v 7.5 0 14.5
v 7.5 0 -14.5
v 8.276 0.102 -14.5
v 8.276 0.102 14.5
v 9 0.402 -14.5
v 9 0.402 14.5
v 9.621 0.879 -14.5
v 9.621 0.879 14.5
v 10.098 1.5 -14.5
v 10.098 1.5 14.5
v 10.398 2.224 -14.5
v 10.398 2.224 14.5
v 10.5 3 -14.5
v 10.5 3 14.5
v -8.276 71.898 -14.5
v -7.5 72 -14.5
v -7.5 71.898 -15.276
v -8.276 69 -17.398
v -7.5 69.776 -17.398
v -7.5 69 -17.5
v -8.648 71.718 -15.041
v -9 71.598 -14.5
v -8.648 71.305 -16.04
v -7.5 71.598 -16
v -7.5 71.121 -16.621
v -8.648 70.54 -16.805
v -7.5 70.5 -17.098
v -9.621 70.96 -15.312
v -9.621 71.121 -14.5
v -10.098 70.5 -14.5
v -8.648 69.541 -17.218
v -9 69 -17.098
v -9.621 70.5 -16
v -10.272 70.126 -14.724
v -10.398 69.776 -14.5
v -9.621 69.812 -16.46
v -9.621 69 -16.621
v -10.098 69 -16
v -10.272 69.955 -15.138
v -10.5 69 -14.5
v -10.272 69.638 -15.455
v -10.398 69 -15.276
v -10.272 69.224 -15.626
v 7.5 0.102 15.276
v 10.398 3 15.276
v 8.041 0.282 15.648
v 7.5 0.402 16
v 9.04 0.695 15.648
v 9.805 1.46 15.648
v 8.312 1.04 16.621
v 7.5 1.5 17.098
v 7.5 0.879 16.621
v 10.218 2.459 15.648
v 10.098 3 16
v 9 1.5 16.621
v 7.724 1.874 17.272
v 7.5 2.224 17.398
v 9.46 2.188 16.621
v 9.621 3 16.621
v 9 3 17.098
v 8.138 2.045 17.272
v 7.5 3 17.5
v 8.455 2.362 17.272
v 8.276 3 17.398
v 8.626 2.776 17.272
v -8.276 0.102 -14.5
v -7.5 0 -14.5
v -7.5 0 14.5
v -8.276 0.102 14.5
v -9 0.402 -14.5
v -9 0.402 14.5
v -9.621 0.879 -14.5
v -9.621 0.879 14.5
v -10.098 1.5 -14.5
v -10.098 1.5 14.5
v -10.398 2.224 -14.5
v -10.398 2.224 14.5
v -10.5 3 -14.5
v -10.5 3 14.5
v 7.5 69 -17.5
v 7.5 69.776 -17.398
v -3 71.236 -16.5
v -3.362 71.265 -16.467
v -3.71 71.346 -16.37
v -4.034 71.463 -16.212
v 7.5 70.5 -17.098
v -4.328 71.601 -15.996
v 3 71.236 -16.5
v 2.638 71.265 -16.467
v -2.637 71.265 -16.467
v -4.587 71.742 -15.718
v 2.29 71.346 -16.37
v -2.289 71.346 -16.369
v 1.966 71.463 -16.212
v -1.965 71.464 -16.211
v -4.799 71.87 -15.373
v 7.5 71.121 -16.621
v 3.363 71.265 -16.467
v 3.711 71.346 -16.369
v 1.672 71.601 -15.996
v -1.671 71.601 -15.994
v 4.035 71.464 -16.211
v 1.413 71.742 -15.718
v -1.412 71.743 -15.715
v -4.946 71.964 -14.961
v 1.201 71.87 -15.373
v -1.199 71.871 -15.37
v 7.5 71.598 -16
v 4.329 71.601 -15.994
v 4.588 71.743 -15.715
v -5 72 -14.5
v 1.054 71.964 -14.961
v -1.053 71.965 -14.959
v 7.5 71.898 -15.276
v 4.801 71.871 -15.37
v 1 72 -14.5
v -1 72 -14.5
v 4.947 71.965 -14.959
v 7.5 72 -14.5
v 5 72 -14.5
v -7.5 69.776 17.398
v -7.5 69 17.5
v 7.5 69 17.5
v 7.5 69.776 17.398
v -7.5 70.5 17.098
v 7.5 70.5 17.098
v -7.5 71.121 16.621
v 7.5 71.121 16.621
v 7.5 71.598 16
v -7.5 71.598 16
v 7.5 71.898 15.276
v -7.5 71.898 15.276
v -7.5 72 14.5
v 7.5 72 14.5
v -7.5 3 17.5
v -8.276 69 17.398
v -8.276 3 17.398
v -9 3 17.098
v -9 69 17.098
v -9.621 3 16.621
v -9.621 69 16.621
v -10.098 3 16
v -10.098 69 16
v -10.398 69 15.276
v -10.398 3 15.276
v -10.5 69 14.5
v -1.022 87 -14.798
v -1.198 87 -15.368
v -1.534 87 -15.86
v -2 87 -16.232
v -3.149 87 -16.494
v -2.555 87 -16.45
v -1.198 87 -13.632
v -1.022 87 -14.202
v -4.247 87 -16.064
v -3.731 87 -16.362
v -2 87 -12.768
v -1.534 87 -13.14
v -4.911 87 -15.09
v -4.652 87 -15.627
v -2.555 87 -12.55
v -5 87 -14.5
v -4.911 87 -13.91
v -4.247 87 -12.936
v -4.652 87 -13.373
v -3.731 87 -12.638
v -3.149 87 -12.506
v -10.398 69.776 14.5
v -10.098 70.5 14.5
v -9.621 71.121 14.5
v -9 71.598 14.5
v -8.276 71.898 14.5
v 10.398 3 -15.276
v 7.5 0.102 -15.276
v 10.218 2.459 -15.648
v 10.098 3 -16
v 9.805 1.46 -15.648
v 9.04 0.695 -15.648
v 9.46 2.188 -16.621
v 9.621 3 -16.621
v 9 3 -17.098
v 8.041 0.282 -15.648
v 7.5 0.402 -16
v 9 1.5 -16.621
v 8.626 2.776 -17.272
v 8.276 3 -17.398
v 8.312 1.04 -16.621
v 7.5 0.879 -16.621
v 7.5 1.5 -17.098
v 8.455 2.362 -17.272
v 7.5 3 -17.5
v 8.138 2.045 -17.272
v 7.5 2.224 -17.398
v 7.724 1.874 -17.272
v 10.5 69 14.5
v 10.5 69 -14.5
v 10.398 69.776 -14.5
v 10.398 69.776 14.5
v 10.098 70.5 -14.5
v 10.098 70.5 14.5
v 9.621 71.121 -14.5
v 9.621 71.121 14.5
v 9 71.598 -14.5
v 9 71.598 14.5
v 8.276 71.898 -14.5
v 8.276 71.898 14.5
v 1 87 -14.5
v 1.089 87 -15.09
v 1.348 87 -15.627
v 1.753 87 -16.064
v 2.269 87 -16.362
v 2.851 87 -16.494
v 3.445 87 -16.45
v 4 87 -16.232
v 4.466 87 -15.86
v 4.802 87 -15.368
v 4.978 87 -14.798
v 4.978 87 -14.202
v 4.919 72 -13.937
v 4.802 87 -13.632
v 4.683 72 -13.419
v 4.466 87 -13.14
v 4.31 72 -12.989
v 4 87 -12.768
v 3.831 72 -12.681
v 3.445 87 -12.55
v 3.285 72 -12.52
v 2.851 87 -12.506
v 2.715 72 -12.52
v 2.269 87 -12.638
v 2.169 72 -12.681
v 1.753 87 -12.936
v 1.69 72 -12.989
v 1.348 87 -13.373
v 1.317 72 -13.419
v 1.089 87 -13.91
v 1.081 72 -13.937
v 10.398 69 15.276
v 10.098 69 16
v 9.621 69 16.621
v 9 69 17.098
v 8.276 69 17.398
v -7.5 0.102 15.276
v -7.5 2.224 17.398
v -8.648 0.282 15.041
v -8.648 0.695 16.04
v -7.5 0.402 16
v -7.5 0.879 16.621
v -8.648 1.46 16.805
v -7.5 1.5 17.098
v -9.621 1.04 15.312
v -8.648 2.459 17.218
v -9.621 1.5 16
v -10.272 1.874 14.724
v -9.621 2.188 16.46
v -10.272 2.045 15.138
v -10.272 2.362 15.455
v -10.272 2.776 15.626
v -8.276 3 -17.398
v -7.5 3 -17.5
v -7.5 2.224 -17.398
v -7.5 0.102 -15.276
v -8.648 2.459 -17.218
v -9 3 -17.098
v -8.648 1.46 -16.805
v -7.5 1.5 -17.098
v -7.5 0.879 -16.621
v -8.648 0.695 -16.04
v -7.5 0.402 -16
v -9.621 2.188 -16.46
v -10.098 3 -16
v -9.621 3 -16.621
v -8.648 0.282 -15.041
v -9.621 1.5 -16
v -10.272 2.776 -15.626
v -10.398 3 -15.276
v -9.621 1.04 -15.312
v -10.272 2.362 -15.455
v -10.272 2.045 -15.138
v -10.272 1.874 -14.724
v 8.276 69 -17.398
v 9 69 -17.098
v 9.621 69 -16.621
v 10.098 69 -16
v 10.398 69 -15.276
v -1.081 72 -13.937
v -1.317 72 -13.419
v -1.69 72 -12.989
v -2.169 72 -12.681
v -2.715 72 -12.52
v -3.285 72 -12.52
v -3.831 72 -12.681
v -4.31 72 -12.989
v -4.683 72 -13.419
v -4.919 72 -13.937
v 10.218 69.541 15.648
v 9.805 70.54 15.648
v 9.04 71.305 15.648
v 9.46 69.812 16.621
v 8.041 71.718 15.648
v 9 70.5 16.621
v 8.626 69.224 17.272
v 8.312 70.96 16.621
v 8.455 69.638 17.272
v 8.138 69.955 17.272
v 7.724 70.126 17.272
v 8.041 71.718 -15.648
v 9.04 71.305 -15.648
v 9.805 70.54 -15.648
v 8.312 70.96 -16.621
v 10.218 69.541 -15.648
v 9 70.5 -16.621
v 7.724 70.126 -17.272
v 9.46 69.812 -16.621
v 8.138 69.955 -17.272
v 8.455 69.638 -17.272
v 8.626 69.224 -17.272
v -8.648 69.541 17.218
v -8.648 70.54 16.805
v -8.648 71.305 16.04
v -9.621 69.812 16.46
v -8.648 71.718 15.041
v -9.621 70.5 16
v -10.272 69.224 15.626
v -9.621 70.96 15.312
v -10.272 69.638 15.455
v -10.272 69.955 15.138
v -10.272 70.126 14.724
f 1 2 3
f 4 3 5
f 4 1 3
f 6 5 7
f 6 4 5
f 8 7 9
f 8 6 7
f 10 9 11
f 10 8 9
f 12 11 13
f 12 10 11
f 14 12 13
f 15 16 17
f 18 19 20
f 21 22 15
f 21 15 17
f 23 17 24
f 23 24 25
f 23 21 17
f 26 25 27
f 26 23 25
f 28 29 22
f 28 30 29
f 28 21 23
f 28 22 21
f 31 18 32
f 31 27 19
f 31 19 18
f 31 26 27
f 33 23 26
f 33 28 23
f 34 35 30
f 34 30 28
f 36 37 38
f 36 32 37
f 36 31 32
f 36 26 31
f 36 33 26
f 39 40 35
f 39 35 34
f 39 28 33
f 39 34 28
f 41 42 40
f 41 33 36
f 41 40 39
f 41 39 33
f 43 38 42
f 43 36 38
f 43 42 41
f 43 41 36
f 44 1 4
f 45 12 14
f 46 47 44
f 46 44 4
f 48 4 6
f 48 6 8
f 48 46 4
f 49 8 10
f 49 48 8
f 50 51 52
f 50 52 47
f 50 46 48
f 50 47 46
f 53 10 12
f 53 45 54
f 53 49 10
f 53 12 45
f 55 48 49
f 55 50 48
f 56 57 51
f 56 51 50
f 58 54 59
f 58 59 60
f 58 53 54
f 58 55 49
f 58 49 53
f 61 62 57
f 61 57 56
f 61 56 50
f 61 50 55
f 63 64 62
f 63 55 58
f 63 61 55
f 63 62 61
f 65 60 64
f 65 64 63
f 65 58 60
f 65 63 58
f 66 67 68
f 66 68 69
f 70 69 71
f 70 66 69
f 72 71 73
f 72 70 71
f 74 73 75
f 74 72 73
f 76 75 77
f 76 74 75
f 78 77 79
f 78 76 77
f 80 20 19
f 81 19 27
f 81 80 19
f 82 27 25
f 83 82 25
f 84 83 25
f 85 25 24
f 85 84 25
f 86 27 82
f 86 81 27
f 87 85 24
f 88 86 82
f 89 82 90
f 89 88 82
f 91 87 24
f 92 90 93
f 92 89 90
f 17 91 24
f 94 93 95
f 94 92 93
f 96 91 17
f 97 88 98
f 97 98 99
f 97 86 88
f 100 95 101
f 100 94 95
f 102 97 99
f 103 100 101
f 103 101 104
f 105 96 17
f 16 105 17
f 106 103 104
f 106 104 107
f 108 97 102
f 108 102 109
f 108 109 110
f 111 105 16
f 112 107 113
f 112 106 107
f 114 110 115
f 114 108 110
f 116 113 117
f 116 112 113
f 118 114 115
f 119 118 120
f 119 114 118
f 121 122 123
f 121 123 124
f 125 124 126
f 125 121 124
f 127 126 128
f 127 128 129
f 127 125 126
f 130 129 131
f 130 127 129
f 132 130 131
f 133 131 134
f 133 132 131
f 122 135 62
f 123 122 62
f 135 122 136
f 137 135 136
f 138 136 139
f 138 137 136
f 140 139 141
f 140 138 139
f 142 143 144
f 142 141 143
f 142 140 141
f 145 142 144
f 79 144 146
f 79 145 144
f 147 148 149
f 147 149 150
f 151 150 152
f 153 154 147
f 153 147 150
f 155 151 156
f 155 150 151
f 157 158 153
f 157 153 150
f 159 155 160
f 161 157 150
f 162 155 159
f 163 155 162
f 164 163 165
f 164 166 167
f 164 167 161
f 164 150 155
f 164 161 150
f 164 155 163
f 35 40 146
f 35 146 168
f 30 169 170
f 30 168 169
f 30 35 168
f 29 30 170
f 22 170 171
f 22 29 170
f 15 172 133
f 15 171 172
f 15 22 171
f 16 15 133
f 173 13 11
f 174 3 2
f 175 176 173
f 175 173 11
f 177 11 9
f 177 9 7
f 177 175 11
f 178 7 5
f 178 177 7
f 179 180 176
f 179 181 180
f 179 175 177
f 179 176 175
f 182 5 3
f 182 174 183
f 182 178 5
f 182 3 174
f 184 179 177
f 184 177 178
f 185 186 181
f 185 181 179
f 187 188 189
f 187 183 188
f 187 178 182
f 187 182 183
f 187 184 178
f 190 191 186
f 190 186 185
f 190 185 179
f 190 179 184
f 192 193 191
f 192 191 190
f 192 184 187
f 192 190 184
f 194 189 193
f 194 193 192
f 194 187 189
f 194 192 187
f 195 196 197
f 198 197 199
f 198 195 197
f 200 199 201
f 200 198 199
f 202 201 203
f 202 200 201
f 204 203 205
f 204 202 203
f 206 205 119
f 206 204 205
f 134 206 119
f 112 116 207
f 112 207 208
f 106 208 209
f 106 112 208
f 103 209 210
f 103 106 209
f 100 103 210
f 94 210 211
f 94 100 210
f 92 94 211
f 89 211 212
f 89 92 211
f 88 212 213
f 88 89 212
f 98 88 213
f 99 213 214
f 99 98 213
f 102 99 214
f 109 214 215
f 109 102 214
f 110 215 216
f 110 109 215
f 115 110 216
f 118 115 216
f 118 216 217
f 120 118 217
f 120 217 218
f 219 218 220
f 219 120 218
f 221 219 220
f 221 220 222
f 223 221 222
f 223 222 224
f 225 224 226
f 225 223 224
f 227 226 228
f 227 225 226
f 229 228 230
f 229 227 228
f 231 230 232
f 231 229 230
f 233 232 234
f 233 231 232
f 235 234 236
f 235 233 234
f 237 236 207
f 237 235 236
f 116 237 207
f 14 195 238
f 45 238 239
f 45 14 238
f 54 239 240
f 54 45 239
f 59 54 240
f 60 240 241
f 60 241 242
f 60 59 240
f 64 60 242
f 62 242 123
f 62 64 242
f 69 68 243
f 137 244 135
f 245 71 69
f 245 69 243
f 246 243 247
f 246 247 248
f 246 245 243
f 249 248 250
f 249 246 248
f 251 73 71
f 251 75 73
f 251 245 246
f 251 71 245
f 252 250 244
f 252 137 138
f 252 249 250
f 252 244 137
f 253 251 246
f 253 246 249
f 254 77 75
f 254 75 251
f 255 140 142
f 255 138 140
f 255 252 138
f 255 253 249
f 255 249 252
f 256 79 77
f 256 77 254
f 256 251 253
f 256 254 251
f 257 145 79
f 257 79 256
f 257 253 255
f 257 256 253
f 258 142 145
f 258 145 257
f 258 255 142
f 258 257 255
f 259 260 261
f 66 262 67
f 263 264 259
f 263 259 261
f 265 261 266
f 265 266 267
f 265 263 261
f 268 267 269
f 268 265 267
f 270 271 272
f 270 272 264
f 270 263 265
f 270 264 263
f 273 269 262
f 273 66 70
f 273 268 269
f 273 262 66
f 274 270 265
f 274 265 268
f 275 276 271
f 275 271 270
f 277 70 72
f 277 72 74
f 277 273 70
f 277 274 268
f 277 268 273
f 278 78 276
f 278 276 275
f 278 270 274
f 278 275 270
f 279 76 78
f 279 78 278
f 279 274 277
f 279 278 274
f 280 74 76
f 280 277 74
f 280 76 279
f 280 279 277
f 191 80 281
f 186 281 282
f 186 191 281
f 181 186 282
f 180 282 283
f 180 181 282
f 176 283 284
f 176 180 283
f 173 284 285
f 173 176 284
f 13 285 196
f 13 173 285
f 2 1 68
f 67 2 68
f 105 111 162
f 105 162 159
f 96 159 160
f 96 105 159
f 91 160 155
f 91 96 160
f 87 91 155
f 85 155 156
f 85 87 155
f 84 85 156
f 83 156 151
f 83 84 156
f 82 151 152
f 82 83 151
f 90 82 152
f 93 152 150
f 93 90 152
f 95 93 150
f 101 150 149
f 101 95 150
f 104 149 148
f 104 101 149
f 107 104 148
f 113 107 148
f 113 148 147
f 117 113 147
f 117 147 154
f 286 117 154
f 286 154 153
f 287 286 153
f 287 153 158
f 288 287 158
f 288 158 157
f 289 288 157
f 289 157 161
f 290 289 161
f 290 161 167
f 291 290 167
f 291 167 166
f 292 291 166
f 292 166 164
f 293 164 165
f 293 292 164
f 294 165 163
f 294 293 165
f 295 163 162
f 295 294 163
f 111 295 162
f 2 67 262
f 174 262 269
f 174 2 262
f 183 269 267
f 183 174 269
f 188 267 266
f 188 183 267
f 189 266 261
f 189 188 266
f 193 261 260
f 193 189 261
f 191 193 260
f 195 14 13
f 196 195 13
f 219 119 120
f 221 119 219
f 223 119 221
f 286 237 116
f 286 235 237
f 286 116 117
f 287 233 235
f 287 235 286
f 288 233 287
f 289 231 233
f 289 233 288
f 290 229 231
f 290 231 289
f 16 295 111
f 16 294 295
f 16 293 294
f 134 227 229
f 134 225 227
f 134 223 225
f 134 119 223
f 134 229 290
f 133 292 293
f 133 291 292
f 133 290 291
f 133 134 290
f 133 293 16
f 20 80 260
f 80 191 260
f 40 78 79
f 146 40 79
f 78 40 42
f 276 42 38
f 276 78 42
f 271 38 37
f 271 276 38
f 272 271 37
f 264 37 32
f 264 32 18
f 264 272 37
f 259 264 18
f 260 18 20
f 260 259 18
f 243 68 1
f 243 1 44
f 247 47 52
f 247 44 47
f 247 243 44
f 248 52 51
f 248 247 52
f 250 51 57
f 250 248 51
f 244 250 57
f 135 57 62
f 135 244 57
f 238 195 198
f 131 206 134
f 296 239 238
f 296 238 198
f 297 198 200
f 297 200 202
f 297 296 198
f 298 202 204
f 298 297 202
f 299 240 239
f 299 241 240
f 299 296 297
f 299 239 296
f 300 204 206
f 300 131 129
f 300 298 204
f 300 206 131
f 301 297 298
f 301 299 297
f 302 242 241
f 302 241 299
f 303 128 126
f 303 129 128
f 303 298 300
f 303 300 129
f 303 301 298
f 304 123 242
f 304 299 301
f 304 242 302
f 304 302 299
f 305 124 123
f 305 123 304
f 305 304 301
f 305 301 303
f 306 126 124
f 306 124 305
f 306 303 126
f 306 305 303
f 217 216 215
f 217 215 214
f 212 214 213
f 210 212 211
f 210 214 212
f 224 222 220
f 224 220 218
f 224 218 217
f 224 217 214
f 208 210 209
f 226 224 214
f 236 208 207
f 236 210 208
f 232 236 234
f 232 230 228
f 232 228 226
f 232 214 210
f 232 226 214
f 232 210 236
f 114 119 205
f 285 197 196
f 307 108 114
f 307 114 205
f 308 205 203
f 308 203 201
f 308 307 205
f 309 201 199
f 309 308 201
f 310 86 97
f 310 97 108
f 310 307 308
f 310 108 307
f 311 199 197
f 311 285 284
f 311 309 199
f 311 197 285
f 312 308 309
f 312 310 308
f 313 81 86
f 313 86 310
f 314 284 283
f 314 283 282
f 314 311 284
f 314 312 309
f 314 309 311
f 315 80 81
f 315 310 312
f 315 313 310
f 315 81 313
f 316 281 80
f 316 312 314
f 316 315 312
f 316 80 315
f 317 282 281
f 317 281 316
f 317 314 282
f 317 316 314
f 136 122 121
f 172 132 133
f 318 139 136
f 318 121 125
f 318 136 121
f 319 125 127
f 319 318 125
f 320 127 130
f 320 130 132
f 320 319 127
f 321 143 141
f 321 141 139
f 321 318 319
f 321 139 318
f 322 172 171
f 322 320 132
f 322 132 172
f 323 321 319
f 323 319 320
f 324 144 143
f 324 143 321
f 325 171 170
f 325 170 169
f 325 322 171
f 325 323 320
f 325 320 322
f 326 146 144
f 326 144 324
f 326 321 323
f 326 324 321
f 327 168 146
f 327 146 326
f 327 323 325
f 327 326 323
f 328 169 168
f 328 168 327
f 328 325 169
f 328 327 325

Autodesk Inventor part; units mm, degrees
ref_plane "YZ Plane" through (0, 0, 0) normal (1, 0, 0) x (0, 1, 0)
ref_plane "XZ Plane" through (0, 0, 0) normal (0, 1, 0) x (-1, 0, 0)
ref_plane "XY Plane" through (0, 0, 0) normal (0, 0, 1) x (1, 0, 0)
sketch "Sketch1" plane through (0, 0, 0) normal (0, 1, 0) x (-1, 0, 0)
  line L0 (10.5, 17.5) -> (-10.5, 17.5)
  line L1 (-10.5, 17.5) -> (-10.5, -17.5)
  line L2 (-10.5, -17.5) -> (10.5, -17.5)
  line L3 (10.5, -17.5) -> (10.5, 17.5)
  line L4 (10.5, 17.5) -> (-10.5, -17.5) construction
  line L5 (-10.5, 17.5) -> (10.5, -17.5) construction
  line L6 (0, -17.5) -> (0, -14.5) construction
  line L7 (0, -14.5) -> (3, -14.5) construction
  circle A0 centre (3, -14.5) radius 2
  circle A1 centre (-3, -14.5) radius 2
  point P0 (0, 0)
  dimension "d0" = 21
  dimension "d1" = 35
  dimension "d5" = 3
  dimension "d6" = 3
  dimension "d7" = 4
extrude "Extrusion1" add sketch "Sketch1" along normal blind 72 contours L3 L2 L1 L0 | A0 | A1
extrude "Extrusion2" add sketch "Sketch1" along normal blind 15 from surface at 72 contours A0 | A1
fillet "Fillet1" radius 3 12 edges at (10.5, 36, 17.5) (10.5, 36, -17.5) (-10.5, 36, 17.5) (-10.5, 36, -17.5) (10.5, 72, 0) (0, 72, 17.5) (0, 72, -17.5) (-10.5, 72, 0) (10.5, 0, 0) (0, 0, 17.5) (-10.5, 0, 0) (0, 0, -17.5)
properties part number "SLS X-CUBE 1250mAh 3S1P 11,1V 60"
